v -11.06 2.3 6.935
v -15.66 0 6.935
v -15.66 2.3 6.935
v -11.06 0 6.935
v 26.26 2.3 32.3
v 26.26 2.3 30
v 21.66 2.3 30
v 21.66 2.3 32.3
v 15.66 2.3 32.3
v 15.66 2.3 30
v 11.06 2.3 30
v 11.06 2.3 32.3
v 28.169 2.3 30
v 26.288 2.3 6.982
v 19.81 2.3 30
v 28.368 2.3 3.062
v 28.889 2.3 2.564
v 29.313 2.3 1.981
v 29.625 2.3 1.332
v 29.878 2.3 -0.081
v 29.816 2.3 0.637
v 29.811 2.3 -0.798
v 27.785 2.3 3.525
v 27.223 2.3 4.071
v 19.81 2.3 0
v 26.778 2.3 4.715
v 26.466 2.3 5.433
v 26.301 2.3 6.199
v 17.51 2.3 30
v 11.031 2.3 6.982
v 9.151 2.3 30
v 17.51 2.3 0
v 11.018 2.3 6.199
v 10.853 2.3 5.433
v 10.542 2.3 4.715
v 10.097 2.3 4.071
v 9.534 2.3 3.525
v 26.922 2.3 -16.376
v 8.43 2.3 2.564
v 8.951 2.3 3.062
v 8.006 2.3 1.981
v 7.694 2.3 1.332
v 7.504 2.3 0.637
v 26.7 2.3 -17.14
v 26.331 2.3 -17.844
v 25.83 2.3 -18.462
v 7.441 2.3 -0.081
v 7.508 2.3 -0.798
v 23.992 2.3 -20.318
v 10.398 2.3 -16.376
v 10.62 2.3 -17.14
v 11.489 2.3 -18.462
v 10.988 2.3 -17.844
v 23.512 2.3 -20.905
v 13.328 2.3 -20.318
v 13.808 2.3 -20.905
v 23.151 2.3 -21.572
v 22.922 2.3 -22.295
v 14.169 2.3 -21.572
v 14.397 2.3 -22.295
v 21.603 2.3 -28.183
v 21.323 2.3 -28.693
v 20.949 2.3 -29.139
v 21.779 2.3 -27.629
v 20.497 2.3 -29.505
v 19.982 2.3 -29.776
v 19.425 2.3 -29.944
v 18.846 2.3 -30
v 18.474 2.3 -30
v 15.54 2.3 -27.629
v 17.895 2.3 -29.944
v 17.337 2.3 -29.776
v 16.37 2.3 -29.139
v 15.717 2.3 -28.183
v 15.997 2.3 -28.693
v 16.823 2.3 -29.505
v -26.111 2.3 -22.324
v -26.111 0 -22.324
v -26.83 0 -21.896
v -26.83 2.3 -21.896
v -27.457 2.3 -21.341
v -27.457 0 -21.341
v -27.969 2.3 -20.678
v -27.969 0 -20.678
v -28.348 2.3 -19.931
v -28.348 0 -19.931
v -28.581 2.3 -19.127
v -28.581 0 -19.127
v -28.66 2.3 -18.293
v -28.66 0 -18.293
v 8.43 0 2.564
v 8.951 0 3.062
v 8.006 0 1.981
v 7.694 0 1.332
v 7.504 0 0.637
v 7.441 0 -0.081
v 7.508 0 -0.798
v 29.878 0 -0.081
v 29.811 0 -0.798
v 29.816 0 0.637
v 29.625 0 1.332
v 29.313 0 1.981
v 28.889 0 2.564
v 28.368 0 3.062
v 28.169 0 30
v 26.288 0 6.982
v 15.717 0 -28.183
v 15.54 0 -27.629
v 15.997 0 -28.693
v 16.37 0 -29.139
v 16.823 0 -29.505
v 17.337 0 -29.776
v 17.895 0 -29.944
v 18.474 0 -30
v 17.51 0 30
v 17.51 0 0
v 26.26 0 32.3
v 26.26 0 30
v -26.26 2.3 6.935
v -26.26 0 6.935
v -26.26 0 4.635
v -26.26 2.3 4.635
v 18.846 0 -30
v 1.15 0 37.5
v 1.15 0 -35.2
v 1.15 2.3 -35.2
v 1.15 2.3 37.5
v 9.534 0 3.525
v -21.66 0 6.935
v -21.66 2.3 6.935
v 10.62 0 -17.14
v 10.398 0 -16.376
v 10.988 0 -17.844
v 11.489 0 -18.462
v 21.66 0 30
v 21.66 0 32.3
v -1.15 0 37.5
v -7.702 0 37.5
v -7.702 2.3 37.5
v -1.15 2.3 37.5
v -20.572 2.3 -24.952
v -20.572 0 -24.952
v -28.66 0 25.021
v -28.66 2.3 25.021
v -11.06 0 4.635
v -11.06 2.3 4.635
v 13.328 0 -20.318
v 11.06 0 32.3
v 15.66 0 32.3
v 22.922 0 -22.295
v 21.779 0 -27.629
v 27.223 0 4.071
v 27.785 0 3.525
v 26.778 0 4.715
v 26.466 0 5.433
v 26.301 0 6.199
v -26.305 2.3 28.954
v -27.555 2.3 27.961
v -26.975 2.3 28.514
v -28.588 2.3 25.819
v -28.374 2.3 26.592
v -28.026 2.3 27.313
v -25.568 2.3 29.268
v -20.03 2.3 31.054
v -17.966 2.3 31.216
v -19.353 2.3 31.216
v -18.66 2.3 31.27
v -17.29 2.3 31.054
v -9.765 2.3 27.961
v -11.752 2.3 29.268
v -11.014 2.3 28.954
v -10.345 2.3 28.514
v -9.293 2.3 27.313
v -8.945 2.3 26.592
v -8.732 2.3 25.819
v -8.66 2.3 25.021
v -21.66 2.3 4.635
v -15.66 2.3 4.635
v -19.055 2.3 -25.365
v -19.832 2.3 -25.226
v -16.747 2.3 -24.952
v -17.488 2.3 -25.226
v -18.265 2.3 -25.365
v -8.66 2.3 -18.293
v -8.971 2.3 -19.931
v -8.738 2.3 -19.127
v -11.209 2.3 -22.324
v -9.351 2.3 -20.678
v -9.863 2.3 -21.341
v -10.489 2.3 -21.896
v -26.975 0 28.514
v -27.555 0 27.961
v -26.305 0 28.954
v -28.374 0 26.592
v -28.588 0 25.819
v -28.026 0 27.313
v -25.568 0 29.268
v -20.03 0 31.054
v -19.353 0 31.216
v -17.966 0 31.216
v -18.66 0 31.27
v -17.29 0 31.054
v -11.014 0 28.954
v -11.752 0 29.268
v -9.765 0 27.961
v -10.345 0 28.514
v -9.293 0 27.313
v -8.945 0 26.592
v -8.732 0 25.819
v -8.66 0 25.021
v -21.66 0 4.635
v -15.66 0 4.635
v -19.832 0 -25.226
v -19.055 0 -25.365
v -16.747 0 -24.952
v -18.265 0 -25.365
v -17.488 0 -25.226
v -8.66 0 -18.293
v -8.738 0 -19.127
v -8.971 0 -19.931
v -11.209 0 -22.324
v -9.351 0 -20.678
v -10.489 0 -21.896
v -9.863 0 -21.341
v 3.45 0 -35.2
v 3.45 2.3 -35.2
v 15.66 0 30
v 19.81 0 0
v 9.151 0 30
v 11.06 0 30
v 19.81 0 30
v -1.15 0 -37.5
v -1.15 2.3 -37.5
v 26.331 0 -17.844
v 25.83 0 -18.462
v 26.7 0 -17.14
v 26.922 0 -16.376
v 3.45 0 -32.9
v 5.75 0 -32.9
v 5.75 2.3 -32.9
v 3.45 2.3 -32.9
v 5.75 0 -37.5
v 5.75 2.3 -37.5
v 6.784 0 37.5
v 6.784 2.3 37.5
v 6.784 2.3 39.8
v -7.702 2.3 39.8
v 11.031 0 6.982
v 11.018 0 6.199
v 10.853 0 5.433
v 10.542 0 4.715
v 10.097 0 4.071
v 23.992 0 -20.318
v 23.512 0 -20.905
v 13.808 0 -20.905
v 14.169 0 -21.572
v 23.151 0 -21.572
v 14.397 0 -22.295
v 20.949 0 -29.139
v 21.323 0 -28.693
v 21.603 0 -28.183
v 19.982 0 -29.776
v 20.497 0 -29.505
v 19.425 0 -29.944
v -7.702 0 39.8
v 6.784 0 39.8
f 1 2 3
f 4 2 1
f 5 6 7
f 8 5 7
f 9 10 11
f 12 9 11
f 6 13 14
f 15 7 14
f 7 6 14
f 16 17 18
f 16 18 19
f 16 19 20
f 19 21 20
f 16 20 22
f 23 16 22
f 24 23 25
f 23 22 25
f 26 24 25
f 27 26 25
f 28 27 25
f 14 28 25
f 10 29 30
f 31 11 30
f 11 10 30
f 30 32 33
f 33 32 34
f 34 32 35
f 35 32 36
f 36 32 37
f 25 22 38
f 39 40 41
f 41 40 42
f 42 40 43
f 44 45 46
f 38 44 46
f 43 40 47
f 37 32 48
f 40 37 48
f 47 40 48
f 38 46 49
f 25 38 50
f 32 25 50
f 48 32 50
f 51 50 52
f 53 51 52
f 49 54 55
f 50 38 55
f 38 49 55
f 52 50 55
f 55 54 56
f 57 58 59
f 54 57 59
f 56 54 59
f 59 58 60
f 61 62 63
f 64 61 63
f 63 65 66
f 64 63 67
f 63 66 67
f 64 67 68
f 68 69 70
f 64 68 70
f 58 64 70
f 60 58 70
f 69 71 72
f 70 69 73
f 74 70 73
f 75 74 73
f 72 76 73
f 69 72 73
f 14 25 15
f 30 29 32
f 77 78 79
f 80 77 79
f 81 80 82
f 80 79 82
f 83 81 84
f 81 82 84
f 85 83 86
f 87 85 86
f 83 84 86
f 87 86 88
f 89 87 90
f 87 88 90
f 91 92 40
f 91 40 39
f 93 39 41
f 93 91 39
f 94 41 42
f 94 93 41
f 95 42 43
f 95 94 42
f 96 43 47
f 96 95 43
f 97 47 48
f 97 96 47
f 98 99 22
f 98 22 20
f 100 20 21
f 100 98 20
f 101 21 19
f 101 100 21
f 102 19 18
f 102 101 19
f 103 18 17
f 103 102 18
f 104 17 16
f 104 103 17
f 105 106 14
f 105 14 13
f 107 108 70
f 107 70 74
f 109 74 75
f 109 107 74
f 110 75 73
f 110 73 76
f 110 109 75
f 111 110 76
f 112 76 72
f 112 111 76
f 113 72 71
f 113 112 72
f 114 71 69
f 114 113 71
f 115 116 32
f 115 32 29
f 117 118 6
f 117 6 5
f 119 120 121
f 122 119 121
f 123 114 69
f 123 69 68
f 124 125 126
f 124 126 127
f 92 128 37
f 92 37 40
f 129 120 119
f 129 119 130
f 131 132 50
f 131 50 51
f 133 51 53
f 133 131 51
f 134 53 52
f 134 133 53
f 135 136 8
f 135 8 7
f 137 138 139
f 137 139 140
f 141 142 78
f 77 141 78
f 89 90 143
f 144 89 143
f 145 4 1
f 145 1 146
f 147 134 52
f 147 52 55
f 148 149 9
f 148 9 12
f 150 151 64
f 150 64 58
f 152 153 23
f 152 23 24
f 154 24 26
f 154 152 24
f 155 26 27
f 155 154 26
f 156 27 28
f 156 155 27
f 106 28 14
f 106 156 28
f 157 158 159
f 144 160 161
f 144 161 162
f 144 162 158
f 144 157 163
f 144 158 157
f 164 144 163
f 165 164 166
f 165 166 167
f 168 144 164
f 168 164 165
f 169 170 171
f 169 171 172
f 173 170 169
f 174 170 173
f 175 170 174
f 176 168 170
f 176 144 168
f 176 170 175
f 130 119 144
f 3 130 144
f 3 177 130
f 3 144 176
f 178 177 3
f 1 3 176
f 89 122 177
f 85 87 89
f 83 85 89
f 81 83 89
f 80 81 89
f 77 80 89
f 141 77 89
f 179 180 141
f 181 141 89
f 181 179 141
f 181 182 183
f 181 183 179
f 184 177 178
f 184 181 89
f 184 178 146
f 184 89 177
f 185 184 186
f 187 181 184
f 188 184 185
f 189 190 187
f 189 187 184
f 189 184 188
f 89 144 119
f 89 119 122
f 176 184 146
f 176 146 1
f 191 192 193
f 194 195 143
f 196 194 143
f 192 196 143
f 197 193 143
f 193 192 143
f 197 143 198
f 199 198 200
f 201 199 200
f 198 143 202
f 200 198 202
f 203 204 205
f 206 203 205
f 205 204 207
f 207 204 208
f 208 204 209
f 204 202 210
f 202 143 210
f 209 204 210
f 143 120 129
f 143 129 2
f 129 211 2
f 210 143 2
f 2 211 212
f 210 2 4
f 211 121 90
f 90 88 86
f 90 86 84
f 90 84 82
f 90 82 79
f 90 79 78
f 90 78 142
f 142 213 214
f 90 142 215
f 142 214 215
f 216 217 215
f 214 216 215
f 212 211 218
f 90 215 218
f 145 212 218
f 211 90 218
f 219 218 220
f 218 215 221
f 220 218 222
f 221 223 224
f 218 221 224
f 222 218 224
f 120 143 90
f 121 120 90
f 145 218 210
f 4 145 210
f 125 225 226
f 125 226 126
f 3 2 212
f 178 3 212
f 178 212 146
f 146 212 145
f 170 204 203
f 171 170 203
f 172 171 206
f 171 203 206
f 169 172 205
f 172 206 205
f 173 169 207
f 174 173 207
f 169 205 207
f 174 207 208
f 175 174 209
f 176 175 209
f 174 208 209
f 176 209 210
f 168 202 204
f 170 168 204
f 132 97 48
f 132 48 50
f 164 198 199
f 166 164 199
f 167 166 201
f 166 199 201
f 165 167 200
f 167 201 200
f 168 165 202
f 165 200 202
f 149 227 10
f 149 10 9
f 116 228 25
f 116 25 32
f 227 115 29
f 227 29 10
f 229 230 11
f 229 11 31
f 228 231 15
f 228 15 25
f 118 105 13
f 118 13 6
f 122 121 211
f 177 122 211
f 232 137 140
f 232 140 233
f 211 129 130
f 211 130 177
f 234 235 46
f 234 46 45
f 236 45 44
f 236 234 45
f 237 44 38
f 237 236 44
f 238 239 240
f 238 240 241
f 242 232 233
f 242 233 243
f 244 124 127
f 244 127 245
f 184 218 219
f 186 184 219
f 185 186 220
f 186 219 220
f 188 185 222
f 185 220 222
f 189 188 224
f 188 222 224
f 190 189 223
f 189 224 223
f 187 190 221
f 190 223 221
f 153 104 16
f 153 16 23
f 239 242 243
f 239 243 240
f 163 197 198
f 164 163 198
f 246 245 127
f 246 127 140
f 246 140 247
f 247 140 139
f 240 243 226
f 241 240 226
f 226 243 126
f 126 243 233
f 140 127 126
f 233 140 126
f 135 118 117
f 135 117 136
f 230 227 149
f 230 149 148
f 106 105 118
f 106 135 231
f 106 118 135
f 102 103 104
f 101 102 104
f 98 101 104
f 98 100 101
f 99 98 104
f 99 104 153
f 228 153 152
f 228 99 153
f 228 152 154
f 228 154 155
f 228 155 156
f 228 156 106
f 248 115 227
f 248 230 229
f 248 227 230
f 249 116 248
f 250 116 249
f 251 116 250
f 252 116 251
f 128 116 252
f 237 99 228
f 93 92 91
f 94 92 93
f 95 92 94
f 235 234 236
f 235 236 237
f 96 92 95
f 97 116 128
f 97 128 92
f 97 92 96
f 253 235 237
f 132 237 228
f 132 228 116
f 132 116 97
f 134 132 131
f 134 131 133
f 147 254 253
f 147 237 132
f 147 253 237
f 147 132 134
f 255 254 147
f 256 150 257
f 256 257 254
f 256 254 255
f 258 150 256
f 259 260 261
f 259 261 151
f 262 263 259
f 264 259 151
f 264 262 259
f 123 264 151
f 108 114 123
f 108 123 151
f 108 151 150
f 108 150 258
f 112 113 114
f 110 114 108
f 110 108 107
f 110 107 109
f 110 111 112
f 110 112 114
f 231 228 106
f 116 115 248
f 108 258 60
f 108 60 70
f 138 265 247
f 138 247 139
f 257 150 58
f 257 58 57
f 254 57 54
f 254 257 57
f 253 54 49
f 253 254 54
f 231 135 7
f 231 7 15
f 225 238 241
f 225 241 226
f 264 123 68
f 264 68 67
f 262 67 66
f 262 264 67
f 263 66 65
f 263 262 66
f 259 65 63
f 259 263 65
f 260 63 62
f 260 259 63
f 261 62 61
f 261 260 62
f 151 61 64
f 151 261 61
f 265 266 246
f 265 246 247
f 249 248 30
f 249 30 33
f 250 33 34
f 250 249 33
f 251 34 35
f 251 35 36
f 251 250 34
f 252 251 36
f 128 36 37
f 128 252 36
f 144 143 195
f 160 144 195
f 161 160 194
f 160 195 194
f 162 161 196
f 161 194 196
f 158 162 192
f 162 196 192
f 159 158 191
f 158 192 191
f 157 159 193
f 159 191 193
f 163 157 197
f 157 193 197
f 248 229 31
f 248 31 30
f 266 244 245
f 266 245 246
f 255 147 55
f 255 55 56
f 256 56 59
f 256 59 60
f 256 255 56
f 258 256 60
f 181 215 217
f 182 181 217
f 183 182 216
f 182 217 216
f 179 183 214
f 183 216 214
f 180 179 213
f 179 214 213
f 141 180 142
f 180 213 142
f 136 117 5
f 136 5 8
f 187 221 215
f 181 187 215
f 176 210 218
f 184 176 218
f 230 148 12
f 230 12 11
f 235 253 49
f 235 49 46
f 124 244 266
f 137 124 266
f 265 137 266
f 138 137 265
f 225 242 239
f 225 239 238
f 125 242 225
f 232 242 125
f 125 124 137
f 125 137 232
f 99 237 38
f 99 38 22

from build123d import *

# Parameters (mm, degrees)
BOSS_EXTRUDE1_DEPTH   = 2.3
SKIER_W               = 4.6
SKIER_H               = 2.3
BOSS_EXTRUDE1_2_DEPTH = 2.3
BOSS_EXTRUDE1_3_DEPTH = 2.3


with BuildPart() as part:
    # skier → Boss-Extrude1 (new body)
    with BuildSketch(Plane(origin=(0, 0, 0), x_dir=(1, 0, 0), z_dir=(0, 1, 0))):
        Polygon((-1.15, 37.5), (5.75, 37.5), (5.75, 32.9), (3.45, 32.9), (3.45, 35.2), (1.15, 35.2), (1.15, -37.5), (6.784344809, -37.5), (6.784344809, -39.8), (-7.702471438, -39.8), (-7.702471438, -37.5), (-1.15, -37.5), align=None)
    extrude(amount=BOSS_EXTRUDE1_DEPTH)


with BuildPart() as body_2:
    # skier → Boss-Extrude1 2 (new body)
    with BuildSketch(Plane(origin=(0, 0, 0), x_dir=(1, 0, 0), z_dir=(0, 1, 0))):
        with BuildLine():
            Line((-20.572488584, 24.952130677), (-26.110552293, 22.324426081))
            ThreePointArc((-26.110552293, 22.324426081), (-27.968995996, 20.678039707), (-28.659772453, 18.293248527))
            Line((-28.659772453, 18.293248527), (-28.659772453, -25.021233516))
            ThreePointArc((-28.659772453, -25.021233516), (-27.804918966, -27.647605369), (-25.567917858, -29.267614518))
            Line((-25.567917858, -29.267614518), (-20.029854149, -31.054453644))
            ThreePointArc((-20.029854149, -31.054453644), (-18.659772453, -31.270008933), (-17.289690758, -31.054453644))
            Line((-17.289690758, -31.054453644), (-11.751627049, -29.267614518))
            ThreePointArc((-11.751627049, -29.267614518), (-9.514625941, -27.647605369), (-8.659772453, -25.021233516))
            Line((-8.659772453, -25.021233516), (-8.659772453, 18.293248527))
            ThreePointArc((-8.659772453, 18.293248527), (-9.350548911, 20.678039707), (-11.208992614, 22.324426081))
            Line((-11.208992614, 22.324426081), (-16.747056323, 24.952130677))
            ThreePointArc((-16.747056323, 24.952130677), (-18.659772453, 25.382889415), (-20.572488584, 24.952130677))
        make_face()
        with Locations((-13.359772453, -5.784651227)):
            Rectangle(SKIER_W, SKIER_H, mode=Mode.SUBTRACT)
        with Locations((-23.959772453, -5.784651227)):
            Rectangle(SKIER_W, SKIER_H, mode=Mode.SUBTRACT)
    extrude(amount=BOSS_EXTRUDE1_2_DEPTH)


with BuildPart() as body_3:
    # skier → Boss-Extrude1 3 (new body)
    with BuildSketch(Plane(origin=(0, 0, 0), x_dir=(1, 0, 0), z_dir=(0, 1, 0))):
        with BuildLine():
            Line((18.473631222, 30), (18.845913685, 30))
            ThreePointArc((18.845913685, 30), (20.73194632, 29.332998264), (21.779320927, 27.628587266))
            Line((21.779320927, 27.628587266), (22.922237033, 22.29497877))
            ThreePointArc((22.922237033, 22.29497877), (23.31530066, 21.229769479), (23.991832273, 20.317917065))
            Line((23.991832273, 20.317917065), (25.83043446, 18.462049206))
            ThreePointArc((25.83043446, 18.462049206), (26.532973857, 17.501318165), (26.921730325, 16.376402992))
            Line((26.921730325, 16.376402992), (29.811362053, 0.798382112))
            ThreePointArc((29.811362053, 0.798382112), (29.625168549, -1.331904313), (28.368166135, -3.061856106))
            Line((28.368166135, -3.061856106), (27.785234308, -3.525436388))
            ThreePointArc((27.785234308, -3.525436388), (26.604421446, -5.066416405), (26.288233028, -6.981870219))
            Line((26.288233028, -6.981870219), (28.168888078, -30))
            Line((28.168888078, -30), (26.259772453, -30))
            Line((26.259772453, -30), (26.259772453, -32.3))
            Line((26.259772453, -32.3), (21.659772453, -32.3))
            Line((21.659772453, -32.3), (21.659772453, -30))
            Line((21.659772453, -30), (19.809772453, -30))
            Line((19.809772453, -30), (19.809772453, 0))
            Line((19.809772453, 0), (17.509772453, 0))
            Line((17.509772453, 0), (17.509772453, -30))
            Line((17.509772453, -30), (15.659772453, -30))
            Line((15.659772453, -30), (15.659772453, -32.3))
            Line((15.659772453, -32.3), (11.059772453, -32.3))
            Line((11.059772453, -32.3), (11.059772453, -30))
            Line((11.059772453, -30), (9.150656829, -30))
            Line((9.150656829, -30), (11.031311879, -6.981870219))
            ThreePointArc((11.031311879, -6.981870219), (10.715123461, -5.066416405), (9.534310599, -3.525436388))
            Line((9.534310599, -3.525436388), (8.951378772, -3.061856106))
            ThreePointArc((8.951378772, -3.061856106), (7.694376358, -1.331904313), (7.508182854, 0.798382112))
            Line((7.508182854, 0.798382112), (10.397814582, 16.376402992))
            ThreePointArc((10.397814582, 16.376402992), (10.78657105, 17.501318165), (11.489110447, 18.462049206))
            Line((11.489110447, 18.462049206), (13.327712634, 20.317917065))
            ThreePointArc((13.327712634, 20.317917065), (14.004244247, 21.229769479), (14.397307874, 22.29497877))
            Line((14.397307874, 22.29497877), (15.54022398, 27.628587266))
            ThreePointArc((15.54022398, 27.628587266), (16.587598587, 29.332998264), (18.473631222, 30))
        make_face()
    extrude(amount=BOSS_EXTRUDE1_3_DEPTH)


solid = Compound([part.part, body_2.part, body_3.part])
